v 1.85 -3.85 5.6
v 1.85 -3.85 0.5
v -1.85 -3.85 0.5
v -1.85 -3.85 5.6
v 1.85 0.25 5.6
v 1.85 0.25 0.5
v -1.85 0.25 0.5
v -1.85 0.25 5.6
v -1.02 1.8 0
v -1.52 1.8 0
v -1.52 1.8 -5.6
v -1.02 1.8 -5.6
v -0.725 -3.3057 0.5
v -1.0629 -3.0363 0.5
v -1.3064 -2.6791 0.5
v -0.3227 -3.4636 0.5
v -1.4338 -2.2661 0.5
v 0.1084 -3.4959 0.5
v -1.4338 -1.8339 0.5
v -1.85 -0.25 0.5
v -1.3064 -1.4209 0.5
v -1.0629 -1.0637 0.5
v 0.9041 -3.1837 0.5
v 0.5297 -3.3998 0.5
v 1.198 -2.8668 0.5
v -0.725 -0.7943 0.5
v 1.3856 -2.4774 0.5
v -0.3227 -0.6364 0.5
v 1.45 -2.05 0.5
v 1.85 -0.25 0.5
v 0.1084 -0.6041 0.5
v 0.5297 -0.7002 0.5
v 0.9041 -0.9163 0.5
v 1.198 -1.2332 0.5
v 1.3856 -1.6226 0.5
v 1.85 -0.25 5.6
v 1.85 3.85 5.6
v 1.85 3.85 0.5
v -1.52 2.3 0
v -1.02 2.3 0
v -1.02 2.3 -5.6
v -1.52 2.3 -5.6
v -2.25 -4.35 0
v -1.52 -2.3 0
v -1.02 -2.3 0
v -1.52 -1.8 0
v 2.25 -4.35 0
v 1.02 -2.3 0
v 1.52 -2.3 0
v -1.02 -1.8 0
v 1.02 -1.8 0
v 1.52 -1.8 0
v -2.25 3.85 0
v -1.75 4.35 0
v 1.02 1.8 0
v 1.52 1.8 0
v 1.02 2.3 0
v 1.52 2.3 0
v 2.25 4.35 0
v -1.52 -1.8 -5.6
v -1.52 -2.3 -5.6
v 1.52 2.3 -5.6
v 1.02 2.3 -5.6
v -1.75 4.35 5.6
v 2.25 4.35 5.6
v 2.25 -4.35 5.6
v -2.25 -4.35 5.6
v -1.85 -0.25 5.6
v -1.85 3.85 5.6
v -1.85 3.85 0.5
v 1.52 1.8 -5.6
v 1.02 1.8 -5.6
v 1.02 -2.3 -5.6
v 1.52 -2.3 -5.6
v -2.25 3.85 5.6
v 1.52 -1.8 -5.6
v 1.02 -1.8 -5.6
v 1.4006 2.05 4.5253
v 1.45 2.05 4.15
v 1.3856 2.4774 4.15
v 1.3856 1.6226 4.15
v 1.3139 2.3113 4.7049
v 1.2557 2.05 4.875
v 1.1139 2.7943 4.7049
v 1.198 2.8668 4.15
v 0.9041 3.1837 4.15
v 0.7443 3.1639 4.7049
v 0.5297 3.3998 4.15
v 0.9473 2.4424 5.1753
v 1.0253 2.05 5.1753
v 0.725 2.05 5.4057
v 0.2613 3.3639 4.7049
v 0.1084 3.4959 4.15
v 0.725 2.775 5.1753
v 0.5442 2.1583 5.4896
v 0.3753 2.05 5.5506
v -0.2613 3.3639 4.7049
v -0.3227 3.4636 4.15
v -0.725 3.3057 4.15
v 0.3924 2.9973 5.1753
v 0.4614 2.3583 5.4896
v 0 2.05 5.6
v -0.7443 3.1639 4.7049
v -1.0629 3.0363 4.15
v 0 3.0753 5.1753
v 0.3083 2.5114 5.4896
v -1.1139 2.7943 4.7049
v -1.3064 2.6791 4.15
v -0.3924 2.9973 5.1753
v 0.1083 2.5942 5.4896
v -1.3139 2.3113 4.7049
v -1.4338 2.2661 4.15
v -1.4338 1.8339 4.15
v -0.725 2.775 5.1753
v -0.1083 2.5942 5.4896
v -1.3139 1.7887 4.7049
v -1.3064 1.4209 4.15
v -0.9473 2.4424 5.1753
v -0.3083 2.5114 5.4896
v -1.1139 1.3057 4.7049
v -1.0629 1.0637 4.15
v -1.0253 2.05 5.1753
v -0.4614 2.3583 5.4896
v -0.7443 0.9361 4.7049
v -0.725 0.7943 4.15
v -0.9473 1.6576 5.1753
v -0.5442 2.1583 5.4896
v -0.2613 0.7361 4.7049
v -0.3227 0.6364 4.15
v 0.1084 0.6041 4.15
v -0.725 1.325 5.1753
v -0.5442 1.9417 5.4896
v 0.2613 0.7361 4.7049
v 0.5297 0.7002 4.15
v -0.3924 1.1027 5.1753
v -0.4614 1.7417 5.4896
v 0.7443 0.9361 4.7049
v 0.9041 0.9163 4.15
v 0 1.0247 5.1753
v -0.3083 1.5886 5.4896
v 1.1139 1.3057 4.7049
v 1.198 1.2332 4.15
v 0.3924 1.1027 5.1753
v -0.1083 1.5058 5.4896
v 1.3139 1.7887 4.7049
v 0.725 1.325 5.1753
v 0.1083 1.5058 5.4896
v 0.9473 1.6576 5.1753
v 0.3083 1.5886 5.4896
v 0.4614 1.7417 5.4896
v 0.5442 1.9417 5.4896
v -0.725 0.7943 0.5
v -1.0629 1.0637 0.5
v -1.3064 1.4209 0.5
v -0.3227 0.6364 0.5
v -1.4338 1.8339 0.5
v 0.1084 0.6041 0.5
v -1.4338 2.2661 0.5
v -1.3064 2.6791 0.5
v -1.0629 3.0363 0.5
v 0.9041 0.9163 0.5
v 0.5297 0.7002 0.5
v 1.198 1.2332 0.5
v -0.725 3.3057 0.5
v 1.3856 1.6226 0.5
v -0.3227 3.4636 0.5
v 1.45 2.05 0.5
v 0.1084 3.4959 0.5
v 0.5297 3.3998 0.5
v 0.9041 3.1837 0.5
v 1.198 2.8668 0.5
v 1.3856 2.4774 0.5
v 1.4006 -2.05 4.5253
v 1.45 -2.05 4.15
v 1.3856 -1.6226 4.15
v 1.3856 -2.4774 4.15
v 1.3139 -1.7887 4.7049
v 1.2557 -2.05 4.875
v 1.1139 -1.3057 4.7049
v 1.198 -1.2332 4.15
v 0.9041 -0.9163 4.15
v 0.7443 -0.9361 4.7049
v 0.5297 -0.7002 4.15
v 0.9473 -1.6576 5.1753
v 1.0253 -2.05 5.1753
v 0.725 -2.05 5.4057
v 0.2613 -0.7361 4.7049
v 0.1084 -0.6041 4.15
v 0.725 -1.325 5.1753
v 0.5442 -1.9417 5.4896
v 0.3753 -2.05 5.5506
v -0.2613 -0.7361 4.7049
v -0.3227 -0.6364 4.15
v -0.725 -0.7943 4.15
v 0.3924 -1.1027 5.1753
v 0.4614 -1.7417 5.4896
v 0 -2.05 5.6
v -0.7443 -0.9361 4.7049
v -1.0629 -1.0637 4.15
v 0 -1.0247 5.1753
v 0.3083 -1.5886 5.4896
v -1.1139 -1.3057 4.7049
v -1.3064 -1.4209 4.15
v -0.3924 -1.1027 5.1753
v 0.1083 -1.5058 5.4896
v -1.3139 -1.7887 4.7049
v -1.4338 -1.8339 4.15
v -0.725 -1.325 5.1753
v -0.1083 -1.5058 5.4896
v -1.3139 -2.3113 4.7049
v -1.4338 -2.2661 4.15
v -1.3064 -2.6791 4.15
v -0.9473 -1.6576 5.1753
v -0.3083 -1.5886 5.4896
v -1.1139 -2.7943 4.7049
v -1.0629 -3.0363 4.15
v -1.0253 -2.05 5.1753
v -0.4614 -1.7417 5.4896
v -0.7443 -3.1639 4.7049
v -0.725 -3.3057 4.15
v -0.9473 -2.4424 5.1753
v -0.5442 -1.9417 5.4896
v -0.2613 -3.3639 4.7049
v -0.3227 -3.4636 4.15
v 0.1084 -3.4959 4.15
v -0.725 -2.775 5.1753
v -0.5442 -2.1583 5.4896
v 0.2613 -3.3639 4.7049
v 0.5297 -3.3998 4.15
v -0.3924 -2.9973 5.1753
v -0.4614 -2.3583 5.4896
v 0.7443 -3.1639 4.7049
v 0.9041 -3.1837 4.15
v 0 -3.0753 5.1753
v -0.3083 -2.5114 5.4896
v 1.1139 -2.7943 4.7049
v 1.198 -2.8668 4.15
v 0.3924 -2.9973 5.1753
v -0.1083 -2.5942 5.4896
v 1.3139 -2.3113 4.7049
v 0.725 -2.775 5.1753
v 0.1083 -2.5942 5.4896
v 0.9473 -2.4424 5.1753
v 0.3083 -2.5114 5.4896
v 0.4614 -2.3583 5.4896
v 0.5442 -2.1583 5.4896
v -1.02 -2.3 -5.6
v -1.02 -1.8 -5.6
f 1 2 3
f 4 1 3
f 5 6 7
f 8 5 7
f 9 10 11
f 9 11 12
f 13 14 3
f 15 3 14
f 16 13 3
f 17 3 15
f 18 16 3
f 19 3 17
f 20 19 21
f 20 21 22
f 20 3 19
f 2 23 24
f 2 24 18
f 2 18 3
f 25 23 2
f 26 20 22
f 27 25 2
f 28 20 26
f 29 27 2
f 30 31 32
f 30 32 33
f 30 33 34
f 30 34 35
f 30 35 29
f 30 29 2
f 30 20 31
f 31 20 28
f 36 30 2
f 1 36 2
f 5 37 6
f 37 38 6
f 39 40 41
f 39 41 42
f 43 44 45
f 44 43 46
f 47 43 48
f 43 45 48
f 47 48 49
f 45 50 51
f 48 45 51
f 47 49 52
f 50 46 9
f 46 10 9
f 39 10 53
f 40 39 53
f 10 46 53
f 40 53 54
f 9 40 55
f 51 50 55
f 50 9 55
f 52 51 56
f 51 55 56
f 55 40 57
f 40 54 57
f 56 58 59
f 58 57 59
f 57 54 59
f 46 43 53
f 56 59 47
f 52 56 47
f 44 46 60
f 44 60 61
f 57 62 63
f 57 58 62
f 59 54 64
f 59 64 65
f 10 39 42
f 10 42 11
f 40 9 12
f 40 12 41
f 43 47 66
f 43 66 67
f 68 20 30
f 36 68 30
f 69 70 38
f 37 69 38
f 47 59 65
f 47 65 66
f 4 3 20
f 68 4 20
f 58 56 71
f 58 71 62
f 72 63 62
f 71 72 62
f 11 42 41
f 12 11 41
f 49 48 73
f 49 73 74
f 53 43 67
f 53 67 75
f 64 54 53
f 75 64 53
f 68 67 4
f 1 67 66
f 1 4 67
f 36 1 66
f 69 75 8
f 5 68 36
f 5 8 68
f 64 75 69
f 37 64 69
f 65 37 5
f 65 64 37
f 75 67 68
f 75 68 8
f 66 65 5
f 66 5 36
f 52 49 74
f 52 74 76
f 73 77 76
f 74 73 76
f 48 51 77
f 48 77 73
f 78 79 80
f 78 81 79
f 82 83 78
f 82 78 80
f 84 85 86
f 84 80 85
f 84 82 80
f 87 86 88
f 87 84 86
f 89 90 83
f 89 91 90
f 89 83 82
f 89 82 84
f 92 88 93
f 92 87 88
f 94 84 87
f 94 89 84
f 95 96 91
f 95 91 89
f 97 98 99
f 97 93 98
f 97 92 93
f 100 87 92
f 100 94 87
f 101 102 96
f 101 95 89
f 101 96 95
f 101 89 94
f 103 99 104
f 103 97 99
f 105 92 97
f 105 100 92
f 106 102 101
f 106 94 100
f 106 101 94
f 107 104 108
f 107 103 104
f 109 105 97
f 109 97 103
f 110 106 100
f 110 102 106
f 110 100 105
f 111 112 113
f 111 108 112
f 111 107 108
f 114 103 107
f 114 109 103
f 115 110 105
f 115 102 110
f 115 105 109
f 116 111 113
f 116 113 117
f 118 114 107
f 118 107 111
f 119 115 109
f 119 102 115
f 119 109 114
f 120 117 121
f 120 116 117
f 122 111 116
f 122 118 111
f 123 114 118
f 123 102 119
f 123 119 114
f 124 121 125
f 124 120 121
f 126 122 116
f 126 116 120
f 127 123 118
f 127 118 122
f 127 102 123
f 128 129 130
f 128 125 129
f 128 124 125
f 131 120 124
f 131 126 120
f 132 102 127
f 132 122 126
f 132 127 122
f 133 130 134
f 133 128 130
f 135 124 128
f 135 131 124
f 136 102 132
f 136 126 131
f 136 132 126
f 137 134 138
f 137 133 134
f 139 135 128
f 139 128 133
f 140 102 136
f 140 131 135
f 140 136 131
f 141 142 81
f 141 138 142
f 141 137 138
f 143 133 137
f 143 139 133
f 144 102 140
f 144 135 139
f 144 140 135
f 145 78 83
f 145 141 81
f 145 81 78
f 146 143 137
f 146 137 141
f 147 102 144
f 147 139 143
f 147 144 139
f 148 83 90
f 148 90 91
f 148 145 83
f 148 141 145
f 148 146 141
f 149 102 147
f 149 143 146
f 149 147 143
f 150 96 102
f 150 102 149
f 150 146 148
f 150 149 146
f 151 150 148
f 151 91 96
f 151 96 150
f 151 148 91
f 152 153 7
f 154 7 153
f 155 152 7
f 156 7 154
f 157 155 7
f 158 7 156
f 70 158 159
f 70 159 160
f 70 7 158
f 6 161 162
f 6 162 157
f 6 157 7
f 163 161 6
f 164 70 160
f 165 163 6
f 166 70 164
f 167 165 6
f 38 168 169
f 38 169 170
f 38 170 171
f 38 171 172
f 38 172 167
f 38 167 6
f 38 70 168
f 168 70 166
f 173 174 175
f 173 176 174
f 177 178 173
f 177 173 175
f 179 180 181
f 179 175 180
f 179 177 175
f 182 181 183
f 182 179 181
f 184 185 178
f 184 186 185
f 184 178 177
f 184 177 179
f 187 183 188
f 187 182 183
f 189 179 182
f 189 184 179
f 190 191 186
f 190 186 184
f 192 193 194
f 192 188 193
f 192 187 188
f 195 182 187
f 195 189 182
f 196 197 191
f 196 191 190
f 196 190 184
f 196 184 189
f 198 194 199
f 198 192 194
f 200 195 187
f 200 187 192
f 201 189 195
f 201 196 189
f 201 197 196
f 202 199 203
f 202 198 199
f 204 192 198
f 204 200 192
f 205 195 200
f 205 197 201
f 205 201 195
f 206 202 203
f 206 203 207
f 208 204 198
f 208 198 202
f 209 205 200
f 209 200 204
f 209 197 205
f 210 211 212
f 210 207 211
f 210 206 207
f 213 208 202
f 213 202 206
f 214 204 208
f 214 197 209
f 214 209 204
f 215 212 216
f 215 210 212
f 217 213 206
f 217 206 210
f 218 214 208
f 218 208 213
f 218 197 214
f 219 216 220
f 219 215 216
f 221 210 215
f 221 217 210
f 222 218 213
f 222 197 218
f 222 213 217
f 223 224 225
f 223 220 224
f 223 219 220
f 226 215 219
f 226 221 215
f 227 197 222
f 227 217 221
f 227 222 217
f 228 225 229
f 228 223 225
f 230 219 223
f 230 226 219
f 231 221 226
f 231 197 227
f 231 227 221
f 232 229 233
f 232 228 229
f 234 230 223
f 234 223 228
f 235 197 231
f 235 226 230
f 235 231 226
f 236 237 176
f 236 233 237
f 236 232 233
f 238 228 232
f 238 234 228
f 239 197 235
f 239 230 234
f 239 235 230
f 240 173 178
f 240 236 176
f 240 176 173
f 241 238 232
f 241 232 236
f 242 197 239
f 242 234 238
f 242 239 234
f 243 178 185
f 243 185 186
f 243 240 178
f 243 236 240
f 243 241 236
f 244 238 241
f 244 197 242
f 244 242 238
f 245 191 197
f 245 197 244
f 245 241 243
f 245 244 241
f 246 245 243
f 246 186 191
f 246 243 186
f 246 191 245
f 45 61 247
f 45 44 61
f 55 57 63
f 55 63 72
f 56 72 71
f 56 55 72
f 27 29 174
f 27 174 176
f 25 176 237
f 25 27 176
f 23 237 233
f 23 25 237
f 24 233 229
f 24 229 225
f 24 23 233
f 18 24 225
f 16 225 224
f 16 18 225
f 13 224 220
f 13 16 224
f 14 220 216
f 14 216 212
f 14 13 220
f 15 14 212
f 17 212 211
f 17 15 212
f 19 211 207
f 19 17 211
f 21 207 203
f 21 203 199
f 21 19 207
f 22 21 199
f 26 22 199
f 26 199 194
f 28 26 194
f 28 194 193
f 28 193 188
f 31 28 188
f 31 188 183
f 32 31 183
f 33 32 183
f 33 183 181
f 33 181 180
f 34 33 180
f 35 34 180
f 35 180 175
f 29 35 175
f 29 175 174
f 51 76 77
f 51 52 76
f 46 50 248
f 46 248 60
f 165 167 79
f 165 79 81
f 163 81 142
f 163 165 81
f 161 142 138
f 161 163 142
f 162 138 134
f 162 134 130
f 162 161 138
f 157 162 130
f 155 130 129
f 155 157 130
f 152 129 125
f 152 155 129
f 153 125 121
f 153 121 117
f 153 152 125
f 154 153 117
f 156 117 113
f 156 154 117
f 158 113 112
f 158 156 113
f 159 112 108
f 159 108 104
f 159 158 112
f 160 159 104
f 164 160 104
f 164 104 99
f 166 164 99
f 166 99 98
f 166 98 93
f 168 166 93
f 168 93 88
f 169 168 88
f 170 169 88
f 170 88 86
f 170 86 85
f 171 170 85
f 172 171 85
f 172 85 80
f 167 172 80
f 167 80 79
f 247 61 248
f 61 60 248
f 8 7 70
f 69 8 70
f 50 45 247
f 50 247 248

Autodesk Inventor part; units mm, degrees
ref_plane "YZ Plane" through (0, 0, 0) normal (1, 0, 0) x (0, 1, 0)
ref_plane "XZ Plane" through (0, 0, 0) normal (0, 1, 0) x (-1, 0, 0)
ref_plane "XY Plane" through (0, 0, 0) normal (0, 0, 1) x (1, 0, 0)
sketch "スケッチ1" plane through (0, 0, 0) normal (0, 0, 1) x (1, 0, 0)
  line L0 (-2.25, 4.35) -> (2.25, 4.35)
  line L1 (2.25, 4.35) -> (2.25, -4.35)
  line L2 (2.25, -4.35) -> (-2.25, -4.35)
  line L3 (-2.25, -4.35) -> (-2.25, 4.35)
  line L4 (-3.4568, 2.05) -> (3.4568, 2.05) construction
  line L5 (3.4568, -2.05) -> (-3.4568, -2.05) construction
  line L6 (-4.4106, 0) -> (4.4106, 0) construction
  line L7 (-1.85, 3.85) -> (1.85, 3.85)
  line L8 (1.85, 3.85) -> (1.85, 0.25)
  line L9 (1.85, 0.25) -> (-1.85, 0.25)
  line L10 (-1.85, 0.25) -> (-1.85, 3.85)
  line L11 (-1.85, -0.25) -> (1.85, -0.25)
  line L12 (1.85, -0.25) -> (1.85, -3.85)
  line L13 (1.85, -3.85) -> (-1.85, -3.85)
  line L14 (-1.85, -3.85) -> (-1.85, -0.25)
  line L15 (-1.75, 4.35) -> (-2.25, 3.85)
  circle A0 centre (0, 2.05) radius 1.45
  circle A1 centre (0, -2.05) radius 1.45
  line L16 (1.27, 5.4107) -> (1.27, -6.214) construction
  line L17 (-1.27, -6.214) -> (-1.27, 5.4107) construction
  line L18 (0, 6.0924) -> (0, -6.0924) construction
  line L19 (1.52, 2.3) -> (1.02, 2.3)
  line L20 (1.02, 2.3) -> (1.02, 1.8)
  line L21 (1.02, 1.8) -> (1.52, 1.8)
  line L22 (1.52, 1.8) -> (1.52, 2.3)
  line L23 (-1.02, 2.3) -> (-1.52, 2.3)
  line L24 (-1.52, 2.3) -> (-1.52, 1.8)
  line L25 (-1.52, 1.8) -> (-1.02, 1.8)
  line L26 (-1.02, 1.8) -> (-1.02, 2.3)
  line L27 (1.52, -1.8) -> (1.02, -1.8)
  line L28 (1.02, -1.8) -> (1.02, -2.3)
  line L29 (1.02, -2.3) -> (1.52, -2.3)
  line L30 (1.52, -2.3) -> (1.52, -1.8)
  line L31 (-1.02, -1.8) -> (-1.52, -1.8)
  line L32 (-1.52, -1.8) -> (-1.52, -2.3)
  line L33 (-1.52, -2.3) -> (-1.02, -2.3)
  line L34 (-1.02, -2.3) -> (-1.02, -1.8)
  point P0 (0, 0)
  point P1 (0, 4.35)
  point P2 (-2.25, 0)
  point P3 (0, 0)
  point P4 (-1.85, 2.05)
  point P5 (0, 3.85)
  point P6 (1.85, -2.05)
  point P7 (0, -3.85)
  point P8 (1.27, 2.3)
  point P9 (1.52, 2.05)
  point P10 (-1.27, 2.3)
  point P11 (-1.52, 2.05)
  point P12 (1.27, -1.8)
  point P13 (1.52, -2.05)
  point P14 (-1.27, -1.8)
  dimension "d0" = 4.5
  dimension "d1" = 8.7
  dimension "d2" = 4.1
  dimension "d3" = 3.7
  dimension "d4" = 3.6
  dimension "d5" = 0.5
  dimension "d6" = 0.5
  dimension "d9" = 2.9
  dimension "d13" = 2.54
  dimension "d14" = 0.5
extrude "押し出し1" add sketch "スケッチ1" along normal blind 5.6 contours L0 L1 L2 L3 L15
extrude "押し出し2" add sketch "スケッチ1" along normal blind 5.6 contours A0 L21 L20 L19 | L19 L20 L21 A0 L25 L26 L23 | L23 L26 L25 A0 | A1 L29 L28 L27 | L27 L28 L29 A1 L33 L34 L31 | L31 L34 L33 A1
fillet "フィレット1" radius 1.45 2 edges at (-1.45, 2.05, 5.6) (-1.45, -2.05, 5.6)
extrude "押し出し3" add sketch "スケッチ1" against normal blind 5.6 contours A0 L21 L20 L19 | A0 L19 L22 L21 | L23 L26 L25 A0 | A0 L25 L24 L23 | A1 L29 L28 L27 | A1 L27 L30 L29 | L31 L34 L33 A1 | A1 L33 L32 L31
extrude "押し出し4" add sketch "スケッチ1" along normal blind 0.5 contours L7 L8 L9 L10 | L11 L12 L13 L14 | A0 L21 L20 L19 | A0 L19 L22 L21 | L19 L20 L21 A0 L25 L26 L23 | L23 L26 L25 A0 | A0 L25 L24 L23 | A1 L29 L28 L27 | A1 L27 L30 L29 | L27 L28 L29 A1 L33 L34 L31 | L31 L34 L33 A1 | A1 L33 L32 L31
equation "\"d6\" = d5"
properties part number "LBR-127"
